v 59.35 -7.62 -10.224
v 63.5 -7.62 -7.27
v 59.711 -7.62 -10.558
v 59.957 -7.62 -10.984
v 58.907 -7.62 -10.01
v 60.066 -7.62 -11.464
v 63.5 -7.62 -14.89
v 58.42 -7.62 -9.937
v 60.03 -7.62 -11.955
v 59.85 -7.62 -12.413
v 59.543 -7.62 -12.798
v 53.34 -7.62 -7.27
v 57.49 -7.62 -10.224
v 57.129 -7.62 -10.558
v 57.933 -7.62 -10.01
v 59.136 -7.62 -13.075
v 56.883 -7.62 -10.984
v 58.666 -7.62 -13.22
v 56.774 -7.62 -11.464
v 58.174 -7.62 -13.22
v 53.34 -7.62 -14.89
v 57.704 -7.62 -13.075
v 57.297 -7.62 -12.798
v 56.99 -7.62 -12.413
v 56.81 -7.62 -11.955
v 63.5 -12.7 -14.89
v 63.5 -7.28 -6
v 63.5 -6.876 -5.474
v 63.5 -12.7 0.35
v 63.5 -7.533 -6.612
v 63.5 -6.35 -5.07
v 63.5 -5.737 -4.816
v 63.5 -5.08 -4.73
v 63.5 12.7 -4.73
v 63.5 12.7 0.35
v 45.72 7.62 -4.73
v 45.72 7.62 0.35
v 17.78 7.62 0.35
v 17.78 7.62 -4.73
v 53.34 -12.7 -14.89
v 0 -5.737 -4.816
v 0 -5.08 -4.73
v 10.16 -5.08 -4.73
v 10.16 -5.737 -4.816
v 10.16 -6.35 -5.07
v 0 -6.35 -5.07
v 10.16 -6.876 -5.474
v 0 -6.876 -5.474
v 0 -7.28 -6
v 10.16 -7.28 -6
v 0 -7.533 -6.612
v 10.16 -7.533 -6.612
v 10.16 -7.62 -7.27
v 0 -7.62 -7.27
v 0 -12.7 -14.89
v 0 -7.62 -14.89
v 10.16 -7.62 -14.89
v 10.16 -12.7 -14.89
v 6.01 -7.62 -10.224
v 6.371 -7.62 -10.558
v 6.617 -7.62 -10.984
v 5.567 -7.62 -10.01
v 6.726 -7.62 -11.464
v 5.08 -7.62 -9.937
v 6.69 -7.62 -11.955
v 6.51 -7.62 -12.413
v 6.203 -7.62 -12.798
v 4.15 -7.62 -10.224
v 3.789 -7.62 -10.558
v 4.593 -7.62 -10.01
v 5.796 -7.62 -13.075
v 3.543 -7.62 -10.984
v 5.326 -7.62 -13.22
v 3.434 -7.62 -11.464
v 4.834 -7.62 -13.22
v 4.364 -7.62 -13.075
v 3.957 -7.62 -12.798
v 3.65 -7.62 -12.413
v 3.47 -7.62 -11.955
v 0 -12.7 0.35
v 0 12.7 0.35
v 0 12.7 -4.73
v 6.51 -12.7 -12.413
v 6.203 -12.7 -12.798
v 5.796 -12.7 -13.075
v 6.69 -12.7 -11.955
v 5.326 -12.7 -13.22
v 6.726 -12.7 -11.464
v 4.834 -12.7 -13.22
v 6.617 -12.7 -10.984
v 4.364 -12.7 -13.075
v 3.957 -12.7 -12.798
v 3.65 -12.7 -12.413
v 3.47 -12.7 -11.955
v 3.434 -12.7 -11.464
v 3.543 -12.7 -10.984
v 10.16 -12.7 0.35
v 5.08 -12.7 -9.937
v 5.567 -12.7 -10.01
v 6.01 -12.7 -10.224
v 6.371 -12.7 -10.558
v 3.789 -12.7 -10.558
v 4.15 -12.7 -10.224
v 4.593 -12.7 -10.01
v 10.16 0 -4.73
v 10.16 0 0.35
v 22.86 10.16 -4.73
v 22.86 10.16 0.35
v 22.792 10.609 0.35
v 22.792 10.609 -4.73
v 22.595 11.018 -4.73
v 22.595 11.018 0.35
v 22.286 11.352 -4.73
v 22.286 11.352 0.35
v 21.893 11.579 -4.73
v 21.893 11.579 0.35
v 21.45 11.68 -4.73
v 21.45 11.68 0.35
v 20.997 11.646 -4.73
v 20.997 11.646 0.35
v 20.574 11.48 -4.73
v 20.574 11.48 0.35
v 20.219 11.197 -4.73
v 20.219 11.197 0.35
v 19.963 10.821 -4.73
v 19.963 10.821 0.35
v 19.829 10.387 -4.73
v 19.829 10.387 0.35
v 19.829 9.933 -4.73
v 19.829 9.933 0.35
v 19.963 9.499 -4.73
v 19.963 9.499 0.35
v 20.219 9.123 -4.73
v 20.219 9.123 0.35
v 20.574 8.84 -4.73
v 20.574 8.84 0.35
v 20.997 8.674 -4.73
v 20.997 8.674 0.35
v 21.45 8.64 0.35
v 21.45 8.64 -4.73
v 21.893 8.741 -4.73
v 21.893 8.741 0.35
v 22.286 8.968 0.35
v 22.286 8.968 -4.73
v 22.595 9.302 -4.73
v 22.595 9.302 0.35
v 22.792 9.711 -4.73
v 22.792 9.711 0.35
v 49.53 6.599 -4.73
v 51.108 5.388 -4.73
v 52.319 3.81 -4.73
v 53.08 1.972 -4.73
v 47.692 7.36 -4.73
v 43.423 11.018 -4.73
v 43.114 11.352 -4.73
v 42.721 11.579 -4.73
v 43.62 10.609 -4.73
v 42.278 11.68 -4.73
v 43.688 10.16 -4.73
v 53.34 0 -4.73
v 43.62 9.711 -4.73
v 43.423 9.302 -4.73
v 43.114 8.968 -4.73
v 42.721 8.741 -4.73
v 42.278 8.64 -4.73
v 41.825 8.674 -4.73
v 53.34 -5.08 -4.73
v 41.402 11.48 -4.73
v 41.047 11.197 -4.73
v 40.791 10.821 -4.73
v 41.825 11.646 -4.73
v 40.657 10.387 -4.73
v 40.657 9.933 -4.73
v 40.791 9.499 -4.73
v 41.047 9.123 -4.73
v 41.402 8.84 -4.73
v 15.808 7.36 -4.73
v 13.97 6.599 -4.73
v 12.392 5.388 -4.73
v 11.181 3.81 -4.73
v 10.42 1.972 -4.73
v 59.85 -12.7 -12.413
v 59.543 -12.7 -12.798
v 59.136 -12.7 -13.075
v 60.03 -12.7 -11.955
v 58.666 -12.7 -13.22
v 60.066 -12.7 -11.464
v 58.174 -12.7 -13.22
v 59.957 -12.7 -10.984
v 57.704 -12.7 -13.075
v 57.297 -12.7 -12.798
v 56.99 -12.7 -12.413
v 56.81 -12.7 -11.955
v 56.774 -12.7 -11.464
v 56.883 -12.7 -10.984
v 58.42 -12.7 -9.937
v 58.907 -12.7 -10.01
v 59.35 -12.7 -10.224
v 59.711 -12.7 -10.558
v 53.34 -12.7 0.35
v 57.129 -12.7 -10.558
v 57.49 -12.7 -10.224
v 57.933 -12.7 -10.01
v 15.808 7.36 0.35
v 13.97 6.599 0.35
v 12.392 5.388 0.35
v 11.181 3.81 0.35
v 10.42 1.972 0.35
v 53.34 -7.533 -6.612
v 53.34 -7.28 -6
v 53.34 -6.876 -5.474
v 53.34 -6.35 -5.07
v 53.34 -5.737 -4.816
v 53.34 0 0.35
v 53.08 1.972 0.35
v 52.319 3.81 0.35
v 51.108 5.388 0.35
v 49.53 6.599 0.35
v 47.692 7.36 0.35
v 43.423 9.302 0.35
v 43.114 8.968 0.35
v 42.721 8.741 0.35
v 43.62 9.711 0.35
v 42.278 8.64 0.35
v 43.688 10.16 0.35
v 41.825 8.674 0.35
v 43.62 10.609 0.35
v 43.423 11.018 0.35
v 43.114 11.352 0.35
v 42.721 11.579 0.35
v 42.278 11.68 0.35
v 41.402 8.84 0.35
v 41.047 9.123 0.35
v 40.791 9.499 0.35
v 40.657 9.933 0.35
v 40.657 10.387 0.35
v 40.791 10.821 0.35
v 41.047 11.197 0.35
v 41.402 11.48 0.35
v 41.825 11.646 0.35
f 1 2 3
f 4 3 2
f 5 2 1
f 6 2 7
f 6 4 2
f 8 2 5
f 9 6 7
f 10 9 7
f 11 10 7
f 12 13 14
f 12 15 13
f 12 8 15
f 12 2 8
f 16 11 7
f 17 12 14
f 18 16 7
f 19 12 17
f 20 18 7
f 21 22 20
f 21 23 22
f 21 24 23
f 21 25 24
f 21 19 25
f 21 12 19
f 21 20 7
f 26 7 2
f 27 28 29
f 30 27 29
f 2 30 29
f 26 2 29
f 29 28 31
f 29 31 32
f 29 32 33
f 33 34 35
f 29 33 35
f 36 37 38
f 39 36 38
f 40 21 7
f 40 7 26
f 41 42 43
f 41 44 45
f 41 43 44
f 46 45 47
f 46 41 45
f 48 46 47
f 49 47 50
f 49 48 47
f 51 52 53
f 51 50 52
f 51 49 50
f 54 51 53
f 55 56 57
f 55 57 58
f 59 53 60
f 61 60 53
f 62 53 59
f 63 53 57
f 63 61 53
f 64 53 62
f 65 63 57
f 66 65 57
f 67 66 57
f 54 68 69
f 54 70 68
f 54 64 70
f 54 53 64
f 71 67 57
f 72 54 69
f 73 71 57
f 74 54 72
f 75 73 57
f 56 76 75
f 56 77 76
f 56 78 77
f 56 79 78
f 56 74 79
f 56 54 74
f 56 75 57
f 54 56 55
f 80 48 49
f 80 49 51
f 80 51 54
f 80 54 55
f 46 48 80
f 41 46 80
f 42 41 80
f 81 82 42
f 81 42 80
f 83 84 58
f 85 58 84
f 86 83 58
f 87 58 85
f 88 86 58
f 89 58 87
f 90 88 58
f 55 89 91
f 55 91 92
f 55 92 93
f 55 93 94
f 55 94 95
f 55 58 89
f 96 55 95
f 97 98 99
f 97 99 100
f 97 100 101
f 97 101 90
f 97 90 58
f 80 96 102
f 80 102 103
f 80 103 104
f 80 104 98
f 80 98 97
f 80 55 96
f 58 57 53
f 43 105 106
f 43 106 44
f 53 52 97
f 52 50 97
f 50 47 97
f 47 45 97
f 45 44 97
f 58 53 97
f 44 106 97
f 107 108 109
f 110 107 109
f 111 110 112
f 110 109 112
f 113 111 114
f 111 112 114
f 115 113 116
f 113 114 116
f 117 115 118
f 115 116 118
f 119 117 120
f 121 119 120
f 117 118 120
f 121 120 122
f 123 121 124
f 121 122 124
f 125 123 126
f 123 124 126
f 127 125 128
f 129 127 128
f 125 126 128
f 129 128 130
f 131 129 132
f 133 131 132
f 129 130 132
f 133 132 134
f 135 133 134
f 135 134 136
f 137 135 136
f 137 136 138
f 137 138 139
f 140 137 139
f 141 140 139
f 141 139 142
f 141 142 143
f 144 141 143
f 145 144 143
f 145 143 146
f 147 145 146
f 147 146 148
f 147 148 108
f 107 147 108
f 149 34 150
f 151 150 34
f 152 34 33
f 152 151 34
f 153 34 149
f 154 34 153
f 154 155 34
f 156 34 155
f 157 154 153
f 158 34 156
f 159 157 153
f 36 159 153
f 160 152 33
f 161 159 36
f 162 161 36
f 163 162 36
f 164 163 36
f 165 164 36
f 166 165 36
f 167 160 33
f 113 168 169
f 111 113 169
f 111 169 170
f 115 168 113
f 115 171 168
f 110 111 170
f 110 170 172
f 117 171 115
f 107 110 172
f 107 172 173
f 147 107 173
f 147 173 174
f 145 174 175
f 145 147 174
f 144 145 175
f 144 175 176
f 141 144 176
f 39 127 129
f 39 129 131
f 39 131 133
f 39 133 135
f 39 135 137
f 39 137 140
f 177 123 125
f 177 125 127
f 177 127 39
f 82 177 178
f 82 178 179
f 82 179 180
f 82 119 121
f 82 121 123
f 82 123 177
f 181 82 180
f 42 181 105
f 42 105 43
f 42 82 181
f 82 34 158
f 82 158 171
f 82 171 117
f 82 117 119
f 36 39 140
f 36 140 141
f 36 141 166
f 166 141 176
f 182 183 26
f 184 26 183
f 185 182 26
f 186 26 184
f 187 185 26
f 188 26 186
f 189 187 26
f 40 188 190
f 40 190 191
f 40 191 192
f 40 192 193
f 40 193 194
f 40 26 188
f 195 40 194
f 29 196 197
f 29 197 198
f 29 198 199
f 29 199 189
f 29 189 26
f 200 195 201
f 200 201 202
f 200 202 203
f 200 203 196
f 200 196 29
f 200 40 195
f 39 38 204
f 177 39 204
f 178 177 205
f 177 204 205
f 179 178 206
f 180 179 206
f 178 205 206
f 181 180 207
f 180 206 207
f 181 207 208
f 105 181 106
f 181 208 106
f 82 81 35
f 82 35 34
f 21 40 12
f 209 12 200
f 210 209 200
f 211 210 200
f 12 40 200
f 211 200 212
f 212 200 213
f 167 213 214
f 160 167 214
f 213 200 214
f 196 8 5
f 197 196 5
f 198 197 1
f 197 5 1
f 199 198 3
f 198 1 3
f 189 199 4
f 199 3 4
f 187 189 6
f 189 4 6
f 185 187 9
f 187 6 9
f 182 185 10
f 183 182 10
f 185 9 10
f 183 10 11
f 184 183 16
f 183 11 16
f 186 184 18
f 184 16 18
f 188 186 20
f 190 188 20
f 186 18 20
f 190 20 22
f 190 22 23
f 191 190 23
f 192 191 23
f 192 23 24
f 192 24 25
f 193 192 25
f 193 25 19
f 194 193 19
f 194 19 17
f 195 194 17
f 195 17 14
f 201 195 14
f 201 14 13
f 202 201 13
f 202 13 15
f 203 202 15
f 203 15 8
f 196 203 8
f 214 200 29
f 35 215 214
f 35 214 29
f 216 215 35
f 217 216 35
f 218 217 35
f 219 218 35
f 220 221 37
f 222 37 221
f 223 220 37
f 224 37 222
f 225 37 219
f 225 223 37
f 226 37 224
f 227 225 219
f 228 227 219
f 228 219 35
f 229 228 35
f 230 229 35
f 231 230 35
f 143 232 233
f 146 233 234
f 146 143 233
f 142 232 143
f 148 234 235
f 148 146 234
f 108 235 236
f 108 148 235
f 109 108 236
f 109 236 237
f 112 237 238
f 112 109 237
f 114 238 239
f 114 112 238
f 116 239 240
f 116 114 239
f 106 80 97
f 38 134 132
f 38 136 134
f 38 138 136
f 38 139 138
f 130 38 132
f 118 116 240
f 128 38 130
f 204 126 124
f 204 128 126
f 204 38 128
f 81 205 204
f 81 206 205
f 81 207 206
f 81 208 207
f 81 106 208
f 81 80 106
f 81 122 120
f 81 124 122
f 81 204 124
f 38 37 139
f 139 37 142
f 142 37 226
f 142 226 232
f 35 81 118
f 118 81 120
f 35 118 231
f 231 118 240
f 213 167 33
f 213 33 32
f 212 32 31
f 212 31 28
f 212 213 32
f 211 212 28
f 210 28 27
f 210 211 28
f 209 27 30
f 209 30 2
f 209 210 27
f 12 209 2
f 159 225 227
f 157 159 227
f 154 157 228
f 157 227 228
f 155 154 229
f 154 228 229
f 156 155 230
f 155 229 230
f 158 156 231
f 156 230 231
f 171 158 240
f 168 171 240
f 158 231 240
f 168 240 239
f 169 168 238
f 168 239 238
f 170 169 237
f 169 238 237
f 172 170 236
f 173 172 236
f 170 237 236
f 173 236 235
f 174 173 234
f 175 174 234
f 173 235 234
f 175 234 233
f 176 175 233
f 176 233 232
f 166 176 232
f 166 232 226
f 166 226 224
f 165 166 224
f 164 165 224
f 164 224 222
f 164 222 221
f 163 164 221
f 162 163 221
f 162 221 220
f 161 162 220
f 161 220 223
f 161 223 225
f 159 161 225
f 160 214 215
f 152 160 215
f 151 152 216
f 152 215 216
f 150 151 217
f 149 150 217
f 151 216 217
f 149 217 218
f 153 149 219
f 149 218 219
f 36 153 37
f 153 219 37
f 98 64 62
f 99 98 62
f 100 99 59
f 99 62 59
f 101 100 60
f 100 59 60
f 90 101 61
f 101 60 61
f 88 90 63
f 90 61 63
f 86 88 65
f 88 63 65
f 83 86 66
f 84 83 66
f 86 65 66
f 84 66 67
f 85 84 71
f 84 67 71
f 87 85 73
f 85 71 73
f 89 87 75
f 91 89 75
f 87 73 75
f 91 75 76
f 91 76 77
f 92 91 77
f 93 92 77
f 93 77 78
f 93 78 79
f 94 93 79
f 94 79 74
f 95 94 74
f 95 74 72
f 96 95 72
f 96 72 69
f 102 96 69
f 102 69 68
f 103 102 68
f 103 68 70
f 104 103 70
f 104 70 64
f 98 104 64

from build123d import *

# Parameters (mm, degrees)
BOSS_EXTRUDE1_DEPTH = 63.5
SKETCH2_R           = 1.524
CUT_EXTRUDE1_DEPTH  = 67.526668337
SKETCH3_R           = 1.651
CUT_EXTRUDE2_DEPTH  = 69.314377924


with BuildPart() as part:
    # Sketch1 → Boss-Extrude1 (new body)
    with BuildSketch(Plane(origin=(0, 0, 0), x_dir=(0, 0, -1), z_dir=(1, 0, 0))):
        with BuildLine():
            Line((7.269655172, -7.62), (14.889655172, -7.62))
            Line((14.889655172, -7.62), (14.889655172, -12.7))
            Line((14.889655172, -12.7), (-0.350344828, -12.7))
            Line((-0.350344828, -12.7), (-0.350344828, 12.7))
            Line((-0.350344828, 12.7), (4.729655172, 12.7))
            Line((4.729655172, 12.7), (4.729655172, -5.08))
            ThreePointArc((4.729655172, -5.08), (5.473603948, -6.876051224), (7.269655172, -7.62))
        make_face()
    extrude(amount=BOSS_EXTRUDE1_DEPTH)

    # Sketch2 → Cut-Extrude1 (cut, through all)
    with BuildSketch(Plane.XY.offset(0.350344828)):
        with Locations((21.336, 10.16)):
            Circle(SKETCH2_R)
        with Locations((42.164, 10.16)):
            Circle(SKETCH2_R)
        with BuildLine():
            Line((10.16, 0), (10.16, -12.7))
            Line((10.16, -12.7), (53.34, -12.7))
            Line((53.34, -12.7), (53.34, 0))
            ThreePointArc((53.34, 0), (51.108153673, 5.388153673), (45.72, 7.62))
            Line((45.72, 7.62), (17.78, 7.62))
            ThreePointArc((17.78, 7.62), (12.391846327, 5.388153673), (10.16, 0))
        make_face()
    extrude(amount=-CUT_EXTRUDE1_DEPTH, mode=Mode.SUBTRACT)

    # Sketch3 → Cut-Extrude2 (cut, through all)
    with BuildSketch(Plane(origin=(0, -7.62, 0), x_dir=(1, 0, 0), z_dir=(0, 1, 0))):
        with Locations(Location((5.08, 11.587655172, 0), (0, 0, 270))):
            Circle(SKETCH3_R)
        with Locations(Location((58.42, 11.587655172, 0), (0, 0, 270))):
            Circle(SKETCH3_R)
    extrude(amount=-CUT_EXTRUDE2_DEPTH, mode=Mode.SUBTRACT)


solid = part.part
